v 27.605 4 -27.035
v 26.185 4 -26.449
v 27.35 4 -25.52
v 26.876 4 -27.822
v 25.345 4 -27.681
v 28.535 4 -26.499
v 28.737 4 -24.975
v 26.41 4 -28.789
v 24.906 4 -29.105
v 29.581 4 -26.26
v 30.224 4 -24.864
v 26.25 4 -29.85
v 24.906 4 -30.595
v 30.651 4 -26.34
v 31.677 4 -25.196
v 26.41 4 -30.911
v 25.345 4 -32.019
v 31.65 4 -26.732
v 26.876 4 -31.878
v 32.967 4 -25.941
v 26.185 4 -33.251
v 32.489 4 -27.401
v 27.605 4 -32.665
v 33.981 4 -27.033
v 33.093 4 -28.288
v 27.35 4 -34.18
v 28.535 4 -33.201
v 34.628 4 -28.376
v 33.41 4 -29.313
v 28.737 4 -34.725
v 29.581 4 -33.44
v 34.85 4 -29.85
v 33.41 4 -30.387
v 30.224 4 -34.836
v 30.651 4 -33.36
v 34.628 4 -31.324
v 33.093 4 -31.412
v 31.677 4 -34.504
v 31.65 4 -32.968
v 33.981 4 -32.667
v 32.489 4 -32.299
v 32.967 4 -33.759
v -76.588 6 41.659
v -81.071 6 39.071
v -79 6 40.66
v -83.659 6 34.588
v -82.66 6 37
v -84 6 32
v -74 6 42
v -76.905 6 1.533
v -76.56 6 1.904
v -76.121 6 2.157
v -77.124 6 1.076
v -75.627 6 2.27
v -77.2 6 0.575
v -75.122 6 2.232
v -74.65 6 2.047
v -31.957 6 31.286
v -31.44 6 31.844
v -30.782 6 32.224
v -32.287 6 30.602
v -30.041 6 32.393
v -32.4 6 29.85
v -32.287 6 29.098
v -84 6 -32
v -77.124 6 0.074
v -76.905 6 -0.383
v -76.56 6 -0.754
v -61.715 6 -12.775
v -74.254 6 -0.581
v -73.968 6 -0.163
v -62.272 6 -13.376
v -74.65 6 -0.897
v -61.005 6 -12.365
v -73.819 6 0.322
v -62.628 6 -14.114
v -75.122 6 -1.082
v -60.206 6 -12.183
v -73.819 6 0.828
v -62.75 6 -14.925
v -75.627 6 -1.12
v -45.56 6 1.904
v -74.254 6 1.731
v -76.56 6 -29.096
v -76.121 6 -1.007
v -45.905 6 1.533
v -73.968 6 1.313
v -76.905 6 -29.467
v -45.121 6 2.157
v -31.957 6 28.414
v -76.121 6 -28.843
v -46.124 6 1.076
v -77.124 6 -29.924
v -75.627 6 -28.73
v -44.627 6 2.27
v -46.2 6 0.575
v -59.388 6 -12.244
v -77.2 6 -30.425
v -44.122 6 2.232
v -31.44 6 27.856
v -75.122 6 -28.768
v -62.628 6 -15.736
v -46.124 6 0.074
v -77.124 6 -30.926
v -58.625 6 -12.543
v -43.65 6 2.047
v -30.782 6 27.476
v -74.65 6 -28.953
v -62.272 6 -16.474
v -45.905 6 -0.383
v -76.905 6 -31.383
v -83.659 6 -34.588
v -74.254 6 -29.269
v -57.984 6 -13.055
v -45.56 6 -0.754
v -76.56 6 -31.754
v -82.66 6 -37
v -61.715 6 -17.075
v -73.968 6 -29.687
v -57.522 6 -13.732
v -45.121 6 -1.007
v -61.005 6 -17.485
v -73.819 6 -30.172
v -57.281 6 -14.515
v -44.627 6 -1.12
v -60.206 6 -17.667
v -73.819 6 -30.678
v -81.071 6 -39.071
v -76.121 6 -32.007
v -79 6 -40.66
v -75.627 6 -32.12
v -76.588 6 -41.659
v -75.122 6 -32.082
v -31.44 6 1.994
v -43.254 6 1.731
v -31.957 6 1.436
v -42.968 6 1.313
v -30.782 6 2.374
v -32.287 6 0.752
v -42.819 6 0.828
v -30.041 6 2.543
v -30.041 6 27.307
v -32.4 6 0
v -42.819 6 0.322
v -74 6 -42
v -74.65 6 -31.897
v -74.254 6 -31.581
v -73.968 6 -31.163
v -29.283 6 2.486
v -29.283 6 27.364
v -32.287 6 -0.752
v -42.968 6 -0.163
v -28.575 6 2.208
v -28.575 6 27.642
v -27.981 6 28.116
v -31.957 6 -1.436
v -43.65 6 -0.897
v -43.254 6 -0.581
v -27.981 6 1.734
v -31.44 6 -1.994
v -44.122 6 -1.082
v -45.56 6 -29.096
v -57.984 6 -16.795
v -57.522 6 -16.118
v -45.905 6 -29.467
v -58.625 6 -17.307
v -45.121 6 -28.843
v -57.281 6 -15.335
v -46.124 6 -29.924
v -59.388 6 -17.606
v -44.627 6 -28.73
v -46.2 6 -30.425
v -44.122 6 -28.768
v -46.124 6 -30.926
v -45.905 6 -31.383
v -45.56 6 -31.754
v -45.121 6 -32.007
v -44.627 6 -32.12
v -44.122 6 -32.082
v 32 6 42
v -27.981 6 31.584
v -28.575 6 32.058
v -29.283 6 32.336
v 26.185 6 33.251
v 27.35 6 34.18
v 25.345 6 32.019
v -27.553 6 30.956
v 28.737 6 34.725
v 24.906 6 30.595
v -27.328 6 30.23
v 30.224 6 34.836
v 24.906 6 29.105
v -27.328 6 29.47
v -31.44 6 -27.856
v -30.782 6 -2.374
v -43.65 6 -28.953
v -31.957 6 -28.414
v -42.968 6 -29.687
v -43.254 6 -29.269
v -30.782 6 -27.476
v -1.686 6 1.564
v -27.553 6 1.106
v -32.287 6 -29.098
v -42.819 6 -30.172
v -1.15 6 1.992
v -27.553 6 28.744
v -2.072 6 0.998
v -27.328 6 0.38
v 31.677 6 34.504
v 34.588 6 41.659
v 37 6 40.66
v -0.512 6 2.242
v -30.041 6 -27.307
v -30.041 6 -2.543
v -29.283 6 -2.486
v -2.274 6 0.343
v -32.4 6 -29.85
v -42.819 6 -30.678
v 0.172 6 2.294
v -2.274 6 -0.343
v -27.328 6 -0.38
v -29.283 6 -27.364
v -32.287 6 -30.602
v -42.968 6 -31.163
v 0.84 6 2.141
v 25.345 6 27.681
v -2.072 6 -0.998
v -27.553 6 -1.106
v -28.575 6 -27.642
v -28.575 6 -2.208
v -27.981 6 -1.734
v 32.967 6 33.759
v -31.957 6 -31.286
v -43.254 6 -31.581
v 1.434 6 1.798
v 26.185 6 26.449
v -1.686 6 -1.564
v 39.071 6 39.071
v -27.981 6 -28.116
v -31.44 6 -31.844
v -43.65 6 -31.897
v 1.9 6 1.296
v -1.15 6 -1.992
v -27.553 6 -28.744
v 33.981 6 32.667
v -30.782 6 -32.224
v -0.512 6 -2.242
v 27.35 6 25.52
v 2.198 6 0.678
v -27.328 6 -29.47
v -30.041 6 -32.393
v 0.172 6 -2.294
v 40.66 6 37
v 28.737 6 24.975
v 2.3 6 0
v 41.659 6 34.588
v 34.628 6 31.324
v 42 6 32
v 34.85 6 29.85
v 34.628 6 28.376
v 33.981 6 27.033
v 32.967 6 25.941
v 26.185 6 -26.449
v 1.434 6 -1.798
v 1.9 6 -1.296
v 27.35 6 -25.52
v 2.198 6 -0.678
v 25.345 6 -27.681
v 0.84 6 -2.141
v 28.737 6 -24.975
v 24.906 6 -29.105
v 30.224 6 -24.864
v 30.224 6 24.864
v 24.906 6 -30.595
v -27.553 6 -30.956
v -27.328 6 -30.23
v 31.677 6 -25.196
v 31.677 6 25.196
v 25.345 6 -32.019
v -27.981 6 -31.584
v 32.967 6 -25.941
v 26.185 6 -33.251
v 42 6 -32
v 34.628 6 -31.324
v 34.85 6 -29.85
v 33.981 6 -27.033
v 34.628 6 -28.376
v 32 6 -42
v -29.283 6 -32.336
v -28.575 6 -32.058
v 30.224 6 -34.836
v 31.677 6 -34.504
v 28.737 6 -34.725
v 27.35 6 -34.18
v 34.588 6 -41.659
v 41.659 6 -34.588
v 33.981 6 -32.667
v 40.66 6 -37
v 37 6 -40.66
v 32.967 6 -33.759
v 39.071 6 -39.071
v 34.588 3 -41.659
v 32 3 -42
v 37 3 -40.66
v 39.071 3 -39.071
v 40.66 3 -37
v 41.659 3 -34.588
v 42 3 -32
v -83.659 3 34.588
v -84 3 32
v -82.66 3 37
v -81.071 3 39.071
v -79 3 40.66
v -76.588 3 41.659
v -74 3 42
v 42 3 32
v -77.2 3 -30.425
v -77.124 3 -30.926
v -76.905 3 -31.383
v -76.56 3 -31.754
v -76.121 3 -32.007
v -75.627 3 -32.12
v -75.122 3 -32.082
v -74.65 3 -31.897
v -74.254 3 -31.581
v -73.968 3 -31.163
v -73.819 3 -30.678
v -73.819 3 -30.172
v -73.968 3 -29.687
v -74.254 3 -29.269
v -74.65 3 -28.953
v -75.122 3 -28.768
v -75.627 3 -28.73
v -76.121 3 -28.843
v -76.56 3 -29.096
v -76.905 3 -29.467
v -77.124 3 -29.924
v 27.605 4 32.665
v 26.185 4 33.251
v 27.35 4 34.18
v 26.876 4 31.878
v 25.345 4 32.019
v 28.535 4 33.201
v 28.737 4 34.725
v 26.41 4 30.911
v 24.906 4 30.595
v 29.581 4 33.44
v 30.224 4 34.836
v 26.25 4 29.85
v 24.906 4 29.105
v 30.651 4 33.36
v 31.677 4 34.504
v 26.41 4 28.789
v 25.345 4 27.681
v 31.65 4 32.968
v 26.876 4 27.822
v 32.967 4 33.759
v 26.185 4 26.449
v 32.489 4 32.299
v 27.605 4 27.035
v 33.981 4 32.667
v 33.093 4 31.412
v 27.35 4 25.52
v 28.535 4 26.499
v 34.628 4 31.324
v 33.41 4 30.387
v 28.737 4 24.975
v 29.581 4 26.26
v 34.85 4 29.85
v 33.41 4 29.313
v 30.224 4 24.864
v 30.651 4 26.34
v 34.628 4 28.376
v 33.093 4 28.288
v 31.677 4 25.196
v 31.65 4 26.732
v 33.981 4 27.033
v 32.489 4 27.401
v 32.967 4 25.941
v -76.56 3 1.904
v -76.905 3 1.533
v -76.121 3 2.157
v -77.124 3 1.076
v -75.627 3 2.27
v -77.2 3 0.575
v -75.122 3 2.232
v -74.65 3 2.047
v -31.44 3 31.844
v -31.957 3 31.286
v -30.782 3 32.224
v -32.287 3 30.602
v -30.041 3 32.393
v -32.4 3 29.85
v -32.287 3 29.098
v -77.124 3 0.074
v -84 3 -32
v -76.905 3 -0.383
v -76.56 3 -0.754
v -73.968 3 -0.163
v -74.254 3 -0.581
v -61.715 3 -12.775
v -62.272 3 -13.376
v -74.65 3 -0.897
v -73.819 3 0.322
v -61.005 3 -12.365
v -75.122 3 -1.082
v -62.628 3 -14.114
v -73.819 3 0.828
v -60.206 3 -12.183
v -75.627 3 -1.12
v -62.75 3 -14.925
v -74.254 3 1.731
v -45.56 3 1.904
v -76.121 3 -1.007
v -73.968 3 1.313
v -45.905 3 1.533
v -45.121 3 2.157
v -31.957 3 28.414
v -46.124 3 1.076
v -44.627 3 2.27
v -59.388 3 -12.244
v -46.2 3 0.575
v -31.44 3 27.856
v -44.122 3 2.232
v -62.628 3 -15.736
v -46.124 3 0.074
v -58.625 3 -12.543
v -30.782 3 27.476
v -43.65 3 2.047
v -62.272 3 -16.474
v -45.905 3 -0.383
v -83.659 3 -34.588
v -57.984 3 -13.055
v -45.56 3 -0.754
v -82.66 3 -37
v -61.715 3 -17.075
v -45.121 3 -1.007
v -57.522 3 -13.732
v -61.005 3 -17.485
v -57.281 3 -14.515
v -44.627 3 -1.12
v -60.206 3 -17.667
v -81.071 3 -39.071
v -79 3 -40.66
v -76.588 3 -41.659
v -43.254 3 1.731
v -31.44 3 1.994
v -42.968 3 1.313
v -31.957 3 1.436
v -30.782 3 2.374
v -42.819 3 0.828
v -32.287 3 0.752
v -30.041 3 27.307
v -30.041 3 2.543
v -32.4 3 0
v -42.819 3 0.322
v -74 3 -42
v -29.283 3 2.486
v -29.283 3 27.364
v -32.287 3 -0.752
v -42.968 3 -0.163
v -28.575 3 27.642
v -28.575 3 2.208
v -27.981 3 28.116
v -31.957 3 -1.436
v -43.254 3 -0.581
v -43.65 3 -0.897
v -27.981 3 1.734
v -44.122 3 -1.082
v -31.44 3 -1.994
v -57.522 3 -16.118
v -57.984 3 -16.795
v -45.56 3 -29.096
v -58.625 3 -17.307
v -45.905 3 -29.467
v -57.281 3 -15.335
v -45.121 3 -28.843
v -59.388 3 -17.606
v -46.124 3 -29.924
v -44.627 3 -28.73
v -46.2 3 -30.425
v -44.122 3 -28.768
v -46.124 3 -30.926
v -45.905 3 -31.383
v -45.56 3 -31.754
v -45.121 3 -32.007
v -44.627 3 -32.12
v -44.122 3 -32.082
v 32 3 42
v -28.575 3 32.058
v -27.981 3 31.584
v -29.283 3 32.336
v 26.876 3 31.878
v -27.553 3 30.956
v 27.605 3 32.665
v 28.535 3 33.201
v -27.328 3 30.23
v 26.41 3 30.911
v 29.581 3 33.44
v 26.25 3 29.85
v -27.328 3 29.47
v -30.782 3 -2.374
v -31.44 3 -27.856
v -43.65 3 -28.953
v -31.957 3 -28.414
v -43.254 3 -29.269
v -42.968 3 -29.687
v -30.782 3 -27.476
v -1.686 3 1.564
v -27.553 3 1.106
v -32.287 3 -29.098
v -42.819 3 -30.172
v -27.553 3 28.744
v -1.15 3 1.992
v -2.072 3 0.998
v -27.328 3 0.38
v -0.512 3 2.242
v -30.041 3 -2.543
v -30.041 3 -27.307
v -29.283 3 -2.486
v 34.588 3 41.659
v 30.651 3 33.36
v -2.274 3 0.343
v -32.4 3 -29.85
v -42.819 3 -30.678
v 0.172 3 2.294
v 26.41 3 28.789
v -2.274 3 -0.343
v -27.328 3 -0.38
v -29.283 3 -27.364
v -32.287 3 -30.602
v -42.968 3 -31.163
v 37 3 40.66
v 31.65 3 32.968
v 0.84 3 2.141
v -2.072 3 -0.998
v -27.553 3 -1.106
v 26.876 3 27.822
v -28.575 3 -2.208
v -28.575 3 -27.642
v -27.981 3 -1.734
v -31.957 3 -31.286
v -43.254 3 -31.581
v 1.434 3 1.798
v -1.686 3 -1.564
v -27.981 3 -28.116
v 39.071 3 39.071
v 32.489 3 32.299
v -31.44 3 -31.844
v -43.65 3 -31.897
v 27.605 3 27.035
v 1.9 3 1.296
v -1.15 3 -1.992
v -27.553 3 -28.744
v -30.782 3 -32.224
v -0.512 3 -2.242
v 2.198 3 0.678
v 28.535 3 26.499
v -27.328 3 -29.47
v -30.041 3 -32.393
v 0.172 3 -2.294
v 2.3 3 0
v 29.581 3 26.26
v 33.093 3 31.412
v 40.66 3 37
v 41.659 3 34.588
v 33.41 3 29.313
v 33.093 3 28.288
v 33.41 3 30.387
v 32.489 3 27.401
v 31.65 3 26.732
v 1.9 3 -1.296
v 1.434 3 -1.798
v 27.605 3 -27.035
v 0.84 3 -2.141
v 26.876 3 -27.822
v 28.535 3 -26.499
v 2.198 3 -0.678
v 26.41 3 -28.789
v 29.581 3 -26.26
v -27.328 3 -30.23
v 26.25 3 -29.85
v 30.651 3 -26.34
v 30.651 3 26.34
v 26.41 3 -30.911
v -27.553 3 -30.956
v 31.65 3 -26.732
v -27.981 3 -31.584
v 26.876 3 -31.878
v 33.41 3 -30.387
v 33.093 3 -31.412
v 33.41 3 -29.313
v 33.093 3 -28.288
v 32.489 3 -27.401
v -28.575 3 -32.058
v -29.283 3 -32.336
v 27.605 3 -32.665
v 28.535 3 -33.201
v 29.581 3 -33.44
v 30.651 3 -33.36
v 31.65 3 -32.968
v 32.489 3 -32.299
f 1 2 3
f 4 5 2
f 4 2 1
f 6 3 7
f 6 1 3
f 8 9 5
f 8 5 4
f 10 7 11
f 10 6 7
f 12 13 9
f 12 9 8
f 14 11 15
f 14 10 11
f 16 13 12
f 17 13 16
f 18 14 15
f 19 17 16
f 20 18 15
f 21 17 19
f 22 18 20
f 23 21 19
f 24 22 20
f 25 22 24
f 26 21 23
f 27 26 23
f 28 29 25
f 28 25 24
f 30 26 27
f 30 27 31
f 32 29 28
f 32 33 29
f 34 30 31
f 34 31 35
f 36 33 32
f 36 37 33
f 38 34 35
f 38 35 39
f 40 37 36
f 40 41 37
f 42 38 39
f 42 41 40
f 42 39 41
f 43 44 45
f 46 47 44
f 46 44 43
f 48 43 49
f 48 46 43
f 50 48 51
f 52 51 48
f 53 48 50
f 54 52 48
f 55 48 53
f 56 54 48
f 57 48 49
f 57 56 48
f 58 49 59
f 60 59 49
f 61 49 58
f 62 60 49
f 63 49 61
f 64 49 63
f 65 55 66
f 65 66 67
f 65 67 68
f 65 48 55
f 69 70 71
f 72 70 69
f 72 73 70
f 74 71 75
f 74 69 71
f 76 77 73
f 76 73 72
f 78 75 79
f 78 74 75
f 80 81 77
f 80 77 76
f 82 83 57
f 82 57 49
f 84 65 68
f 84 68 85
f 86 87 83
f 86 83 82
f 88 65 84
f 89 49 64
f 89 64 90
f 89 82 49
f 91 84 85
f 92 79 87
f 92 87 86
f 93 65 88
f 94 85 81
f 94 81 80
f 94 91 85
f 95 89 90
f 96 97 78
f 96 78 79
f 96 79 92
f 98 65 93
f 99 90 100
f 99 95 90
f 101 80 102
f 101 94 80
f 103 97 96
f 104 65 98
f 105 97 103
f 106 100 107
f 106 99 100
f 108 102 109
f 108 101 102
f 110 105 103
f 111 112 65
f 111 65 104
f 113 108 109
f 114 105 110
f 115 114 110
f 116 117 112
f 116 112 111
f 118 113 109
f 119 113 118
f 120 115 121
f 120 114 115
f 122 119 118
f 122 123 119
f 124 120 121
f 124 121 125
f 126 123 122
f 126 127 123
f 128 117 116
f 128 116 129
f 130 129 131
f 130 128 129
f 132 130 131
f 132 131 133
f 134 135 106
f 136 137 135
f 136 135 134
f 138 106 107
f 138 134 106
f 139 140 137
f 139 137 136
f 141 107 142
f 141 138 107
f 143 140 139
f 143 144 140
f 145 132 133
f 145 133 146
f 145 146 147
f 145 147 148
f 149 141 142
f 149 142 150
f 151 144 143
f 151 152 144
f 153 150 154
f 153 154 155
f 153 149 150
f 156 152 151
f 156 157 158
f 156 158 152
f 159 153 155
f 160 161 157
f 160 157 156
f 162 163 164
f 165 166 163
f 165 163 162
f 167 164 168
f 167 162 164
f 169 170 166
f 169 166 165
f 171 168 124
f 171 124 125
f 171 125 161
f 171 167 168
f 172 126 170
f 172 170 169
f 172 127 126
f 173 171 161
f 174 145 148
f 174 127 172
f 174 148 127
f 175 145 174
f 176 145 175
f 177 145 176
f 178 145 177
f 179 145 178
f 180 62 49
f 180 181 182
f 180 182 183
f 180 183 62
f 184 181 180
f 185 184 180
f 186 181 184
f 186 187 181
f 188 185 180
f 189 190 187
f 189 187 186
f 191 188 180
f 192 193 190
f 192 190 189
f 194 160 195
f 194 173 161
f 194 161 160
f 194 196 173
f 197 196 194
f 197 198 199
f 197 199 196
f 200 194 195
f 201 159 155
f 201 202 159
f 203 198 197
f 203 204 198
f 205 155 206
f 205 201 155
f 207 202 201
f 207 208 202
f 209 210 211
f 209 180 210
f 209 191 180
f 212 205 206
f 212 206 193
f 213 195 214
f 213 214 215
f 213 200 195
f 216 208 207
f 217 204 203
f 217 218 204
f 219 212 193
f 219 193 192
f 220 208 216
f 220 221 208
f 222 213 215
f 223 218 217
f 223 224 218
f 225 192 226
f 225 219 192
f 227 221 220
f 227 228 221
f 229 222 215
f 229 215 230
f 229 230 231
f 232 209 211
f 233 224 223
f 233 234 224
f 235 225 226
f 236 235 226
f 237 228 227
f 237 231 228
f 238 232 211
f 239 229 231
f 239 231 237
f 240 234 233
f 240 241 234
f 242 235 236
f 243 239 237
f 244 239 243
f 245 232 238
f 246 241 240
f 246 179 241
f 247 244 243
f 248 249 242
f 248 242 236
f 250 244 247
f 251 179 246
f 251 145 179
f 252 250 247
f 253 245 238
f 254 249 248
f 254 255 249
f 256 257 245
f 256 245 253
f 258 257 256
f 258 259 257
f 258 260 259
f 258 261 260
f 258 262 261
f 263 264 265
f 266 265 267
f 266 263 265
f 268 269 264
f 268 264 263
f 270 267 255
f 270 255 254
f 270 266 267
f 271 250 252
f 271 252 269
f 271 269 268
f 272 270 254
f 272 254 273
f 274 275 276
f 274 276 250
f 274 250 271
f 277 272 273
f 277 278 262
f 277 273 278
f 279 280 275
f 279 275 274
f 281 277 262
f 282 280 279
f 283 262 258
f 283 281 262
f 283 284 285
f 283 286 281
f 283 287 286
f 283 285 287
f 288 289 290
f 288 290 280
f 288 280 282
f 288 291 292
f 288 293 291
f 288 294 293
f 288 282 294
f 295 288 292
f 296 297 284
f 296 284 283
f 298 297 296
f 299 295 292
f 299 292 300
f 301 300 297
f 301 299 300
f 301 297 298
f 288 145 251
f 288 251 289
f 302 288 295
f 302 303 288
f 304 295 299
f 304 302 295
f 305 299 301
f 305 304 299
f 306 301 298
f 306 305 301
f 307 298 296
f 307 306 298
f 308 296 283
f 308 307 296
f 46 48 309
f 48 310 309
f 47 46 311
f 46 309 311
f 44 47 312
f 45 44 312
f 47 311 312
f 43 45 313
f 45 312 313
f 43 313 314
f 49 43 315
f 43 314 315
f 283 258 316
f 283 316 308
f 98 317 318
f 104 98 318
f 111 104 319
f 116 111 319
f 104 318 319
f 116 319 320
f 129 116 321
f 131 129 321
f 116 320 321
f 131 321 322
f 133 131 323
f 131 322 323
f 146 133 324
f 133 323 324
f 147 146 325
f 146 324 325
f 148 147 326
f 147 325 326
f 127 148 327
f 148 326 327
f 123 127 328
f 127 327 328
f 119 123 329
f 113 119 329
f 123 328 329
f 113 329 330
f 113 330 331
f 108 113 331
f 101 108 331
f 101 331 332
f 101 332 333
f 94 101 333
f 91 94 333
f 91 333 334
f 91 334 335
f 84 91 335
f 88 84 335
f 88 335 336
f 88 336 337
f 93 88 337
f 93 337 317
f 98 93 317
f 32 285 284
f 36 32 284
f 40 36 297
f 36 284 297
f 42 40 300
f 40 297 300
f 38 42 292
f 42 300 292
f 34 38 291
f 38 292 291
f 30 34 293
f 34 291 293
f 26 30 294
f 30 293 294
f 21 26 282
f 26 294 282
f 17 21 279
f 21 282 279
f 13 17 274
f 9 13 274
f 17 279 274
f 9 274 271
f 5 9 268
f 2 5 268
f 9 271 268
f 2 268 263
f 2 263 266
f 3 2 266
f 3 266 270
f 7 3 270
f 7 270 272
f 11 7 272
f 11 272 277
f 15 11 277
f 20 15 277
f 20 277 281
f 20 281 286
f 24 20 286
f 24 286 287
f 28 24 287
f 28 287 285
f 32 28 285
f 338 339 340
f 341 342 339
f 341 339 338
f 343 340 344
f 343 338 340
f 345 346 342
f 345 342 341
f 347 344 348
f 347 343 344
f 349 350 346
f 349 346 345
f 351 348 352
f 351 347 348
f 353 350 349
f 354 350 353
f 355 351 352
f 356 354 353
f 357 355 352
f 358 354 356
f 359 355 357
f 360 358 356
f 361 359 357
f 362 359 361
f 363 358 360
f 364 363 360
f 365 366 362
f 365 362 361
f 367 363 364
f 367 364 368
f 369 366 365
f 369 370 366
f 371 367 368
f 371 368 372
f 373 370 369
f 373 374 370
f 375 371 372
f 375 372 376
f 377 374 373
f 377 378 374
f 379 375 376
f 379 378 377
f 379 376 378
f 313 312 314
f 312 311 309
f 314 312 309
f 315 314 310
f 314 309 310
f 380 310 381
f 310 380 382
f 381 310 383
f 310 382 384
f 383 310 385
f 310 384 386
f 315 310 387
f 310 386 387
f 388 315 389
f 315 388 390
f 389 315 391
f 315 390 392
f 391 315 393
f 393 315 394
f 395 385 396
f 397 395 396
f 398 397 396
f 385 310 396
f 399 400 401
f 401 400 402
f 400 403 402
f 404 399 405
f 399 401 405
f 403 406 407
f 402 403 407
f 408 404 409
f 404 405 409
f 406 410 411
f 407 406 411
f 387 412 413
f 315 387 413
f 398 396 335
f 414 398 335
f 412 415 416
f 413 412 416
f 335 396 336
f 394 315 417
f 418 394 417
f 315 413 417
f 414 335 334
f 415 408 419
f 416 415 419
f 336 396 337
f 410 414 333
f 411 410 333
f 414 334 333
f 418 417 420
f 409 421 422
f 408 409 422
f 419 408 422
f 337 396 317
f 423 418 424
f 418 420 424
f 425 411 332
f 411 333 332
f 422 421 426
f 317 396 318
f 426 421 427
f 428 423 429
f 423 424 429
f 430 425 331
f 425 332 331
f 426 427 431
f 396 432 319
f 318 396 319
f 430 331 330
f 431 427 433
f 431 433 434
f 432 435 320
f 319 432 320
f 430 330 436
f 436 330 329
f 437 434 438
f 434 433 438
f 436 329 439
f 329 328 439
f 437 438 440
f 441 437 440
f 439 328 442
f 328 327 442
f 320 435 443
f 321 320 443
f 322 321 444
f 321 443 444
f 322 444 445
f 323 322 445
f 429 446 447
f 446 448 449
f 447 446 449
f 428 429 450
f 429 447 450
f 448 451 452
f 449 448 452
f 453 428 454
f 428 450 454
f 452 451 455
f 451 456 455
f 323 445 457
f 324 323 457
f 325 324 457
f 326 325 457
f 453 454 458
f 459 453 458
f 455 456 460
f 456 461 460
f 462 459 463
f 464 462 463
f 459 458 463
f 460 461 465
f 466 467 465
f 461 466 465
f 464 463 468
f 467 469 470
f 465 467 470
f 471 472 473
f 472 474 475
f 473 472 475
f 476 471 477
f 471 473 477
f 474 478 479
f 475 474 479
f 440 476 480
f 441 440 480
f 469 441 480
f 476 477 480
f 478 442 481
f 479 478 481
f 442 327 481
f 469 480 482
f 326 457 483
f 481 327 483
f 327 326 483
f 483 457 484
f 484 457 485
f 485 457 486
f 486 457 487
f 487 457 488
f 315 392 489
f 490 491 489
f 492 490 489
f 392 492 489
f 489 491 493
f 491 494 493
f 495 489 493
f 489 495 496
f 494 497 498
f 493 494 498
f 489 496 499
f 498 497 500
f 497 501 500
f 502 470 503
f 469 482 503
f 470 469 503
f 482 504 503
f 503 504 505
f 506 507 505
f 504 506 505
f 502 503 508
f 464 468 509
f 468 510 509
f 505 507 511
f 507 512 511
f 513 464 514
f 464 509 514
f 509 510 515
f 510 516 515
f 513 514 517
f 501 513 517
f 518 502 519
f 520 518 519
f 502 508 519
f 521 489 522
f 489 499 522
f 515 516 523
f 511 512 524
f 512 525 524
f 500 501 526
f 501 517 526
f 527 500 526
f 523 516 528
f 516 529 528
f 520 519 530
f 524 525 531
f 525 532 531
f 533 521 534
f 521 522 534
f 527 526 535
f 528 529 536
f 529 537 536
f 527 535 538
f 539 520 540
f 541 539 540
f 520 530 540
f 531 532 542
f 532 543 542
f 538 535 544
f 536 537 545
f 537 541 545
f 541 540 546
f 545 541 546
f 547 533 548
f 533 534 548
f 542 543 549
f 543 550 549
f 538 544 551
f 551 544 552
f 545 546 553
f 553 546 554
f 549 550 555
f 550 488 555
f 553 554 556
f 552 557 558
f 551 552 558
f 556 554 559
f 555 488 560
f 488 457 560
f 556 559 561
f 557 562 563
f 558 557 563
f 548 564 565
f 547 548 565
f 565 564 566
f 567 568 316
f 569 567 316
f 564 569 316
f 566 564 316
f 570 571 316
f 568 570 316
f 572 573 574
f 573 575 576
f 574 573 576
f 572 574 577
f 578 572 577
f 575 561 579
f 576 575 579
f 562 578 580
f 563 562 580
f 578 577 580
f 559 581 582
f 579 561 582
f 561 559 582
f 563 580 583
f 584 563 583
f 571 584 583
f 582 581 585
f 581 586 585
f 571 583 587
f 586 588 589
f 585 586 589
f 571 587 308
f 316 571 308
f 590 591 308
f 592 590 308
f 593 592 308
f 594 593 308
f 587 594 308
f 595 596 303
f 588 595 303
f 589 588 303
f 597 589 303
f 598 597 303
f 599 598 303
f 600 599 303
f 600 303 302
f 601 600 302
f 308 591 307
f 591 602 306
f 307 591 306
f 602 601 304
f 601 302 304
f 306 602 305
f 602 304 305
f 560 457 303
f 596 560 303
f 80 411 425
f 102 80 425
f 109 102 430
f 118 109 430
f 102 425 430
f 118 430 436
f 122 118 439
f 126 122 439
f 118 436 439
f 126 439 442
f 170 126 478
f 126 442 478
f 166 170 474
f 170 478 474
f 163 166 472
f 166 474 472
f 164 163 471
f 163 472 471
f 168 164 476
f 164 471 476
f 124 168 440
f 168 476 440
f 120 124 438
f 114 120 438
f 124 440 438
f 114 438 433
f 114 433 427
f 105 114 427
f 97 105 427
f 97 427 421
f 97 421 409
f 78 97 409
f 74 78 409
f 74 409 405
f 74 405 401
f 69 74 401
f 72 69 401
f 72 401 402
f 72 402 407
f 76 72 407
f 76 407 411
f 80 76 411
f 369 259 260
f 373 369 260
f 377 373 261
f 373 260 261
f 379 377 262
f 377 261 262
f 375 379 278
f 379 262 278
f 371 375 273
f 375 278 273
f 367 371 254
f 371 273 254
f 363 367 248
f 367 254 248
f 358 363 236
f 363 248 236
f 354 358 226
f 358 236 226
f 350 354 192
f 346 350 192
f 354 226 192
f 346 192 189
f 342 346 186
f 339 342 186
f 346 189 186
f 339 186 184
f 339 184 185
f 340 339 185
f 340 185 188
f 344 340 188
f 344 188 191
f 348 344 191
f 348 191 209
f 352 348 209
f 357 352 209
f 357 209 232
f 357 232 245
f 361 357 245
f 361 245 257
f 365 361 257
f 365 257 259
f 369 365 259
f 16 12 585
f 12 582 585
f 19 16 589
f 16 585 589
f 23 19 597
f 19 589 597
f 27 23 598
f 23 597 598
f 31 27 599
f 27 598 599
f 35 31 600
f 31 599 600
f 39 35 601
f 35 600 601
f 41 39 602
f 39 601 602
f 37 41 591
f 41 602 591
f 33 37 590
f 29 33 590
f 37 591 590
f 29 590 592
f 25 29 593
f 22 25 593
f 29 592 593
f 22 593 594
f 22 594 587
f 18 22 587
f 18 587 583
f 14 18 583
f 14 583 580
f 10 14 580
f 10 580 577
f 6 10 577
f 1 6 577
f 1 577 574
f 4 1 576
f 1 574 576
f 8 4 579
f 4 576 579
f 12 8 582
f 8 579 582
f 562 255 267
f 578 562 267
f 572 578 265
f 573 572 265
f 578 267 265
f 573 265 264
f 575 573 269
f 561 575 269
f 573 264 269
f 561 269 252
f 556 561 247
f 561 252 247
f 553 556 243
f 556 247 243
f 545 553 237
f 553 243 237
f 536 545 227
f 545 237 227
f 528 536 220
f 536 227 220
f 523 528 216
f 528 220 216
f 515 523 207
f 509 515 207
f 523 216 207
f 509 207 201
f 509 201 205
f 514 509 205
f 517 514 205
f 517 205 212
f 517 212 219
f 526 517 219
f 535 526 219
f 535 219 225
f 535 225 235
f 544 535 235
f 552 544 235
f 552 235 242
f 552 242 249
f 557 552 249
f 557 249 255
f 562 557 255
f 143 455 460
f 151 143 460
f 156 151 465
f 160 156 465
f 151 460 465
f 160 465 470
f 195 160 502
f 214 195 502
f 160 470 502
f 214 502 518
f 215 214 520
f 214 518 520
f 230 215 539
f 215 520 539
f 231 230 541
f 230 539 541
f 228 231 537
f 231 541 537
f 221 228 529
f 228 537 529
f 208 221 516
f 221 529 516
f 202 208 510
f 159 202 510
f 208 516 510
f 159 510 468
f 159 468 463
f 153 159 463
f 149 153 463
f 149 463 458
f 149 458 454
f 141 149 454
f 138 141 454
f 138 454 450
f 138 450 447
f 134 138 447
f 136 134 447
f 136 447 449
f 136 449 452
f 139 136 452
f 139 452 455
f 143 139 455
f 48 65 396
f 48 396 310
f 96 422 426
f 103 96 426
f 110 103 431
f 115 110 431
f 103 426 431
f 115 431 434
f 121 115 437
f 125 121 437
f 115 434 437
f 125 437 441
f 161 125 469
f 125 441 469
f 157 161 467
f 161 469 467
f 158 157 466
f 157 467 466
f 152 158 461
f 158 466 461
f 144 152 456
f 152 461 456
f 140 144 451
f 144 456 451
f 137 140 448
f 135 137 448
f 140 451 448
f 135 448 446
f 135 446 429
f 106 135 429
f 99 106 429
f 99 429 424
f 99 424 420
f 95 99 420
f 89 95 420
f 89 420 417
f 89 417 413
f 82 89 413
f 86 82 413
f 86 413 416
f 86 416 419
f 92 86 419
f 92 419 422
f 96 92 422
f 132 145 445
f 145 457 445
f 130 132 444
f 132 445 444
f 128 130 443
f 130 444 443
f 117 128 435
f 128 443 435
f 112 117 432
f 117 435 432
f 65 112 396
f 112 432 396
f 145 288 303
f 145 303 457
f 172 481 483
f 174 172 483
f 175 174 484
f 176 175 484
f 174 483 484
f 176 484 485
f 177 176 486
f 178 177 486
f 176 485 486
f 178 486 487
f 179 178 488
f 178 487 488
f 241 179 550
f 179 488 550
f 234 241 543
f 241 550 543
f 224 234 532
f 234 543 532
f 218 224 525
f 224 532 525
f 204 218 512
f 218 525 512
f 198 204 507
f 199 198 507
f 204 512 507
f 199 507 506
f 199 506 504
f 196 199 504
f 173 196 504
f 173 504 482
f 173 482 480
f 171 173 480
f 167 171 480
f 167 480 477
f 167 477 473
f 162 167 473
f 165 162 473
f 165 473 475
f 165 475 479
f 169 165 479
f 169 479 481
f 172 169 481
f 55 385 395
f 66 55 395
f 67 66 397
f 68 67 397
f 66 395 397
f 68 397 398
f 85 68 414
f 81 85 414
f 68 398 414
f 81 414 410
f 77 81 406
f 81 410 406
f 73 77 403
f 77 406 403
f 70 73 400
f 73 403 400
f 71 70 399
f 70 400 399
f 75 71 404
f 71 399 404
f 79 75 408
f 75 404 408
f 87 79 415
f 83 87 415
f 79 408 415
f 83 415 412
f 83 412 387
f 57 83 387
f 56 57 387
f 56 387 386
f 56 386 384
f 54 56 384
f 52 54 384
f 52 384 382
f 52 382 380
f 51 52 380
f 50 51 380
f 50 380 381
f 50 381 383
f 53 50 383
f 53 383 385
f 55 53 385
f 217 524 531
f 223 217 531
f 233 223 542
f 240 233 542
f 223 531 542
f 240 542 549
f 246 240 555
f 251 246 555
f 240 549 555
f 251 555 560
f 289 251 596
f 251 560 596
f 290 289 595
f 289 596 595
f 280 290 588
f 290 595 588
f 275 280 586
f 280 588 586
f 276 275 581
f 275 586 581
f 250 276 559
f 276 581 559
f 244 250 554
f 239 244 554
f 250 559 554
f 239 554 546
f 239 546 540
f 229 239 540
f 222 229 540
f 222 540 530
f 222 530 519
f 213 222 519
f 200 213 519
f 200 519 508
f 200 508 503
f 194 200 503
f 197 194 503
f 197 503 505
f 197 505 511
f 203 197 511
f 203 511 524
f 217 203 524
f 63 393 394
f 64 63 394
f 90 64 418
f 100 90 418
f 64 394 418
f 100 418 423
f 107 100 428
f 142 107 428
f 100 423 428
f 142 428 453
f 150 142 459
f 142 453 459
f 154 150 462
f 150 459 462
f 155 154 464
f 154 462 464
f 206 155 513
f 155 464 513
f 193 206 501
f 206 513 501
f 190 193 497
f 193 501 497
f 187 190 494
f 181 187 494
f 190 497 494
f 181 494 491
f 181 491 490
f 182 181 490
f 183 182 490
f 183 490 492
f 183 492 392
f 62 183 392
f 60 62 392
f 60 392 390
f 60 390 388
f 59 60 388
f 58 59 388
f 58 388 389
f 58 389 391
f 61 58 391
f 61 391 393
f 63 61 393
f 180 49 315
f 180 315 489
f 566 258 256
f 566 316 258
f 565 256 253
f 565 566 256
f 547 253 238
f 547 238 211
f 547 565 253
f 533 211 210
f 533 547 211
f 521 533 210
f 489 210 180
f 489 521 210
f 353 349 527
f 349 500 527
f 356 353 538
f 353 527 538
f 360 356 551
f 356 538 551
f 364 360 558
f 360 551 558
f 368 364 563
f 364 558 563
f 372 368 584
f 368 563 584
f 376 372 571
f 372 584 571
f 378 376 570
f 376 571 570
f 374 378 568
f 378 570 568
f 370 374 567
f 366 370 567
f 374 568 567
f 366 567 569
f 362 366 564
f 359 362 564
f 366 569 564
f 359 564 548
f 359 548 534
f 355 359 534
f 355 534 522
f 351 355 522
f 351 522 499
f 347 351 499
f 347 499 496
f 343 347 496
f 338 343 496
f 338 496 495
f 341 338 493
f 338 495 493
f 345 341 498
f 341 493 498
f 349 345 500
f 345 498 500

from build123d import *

# Parameters (mm, degrees)
BOSS_EXTRUDE1_DEPTH              = 3
F_4_6_4_6_DIAMETER_HOLE1_D       = 4.6
CBORE_FOR_M6_5_SHSS1_D           = 7.2
CBORE_FOR_M6_5_SHSS1_CBORE_D     = 10
CBORE_FOR_M6_5_SHSS1_CBORE_DEPTH = 2
M10X1_0_TAPPED_HOLE1_D           = 5.1
F_3_0MM_DOWEL_HOLE1_D            = 3.4
F_5_0MM_DOWEL_HOLE1_D            = 5.5
FILLET3_R                        = 10


with BuildPart() as part:
    # Sketch1 → Boss-Extrude1 (new body)
    with BuildSketch(Plane(origin=(0, 6, 0), x_dir=(1, 0, 0), z_dir=(0, 1, 0))):
        Polygon((42, 42), (-42, 42), (-84, 42), (-84, -42), (-42, -42), (42, -42), align=None)
    extrude(amount=-BOSS_EXTRUDE1_DEPTH)

    # Ø4.6 (4.6) Diameter Hole1 (through all)
    with Locations(Plane(origin=(0, 3, 0), x_dir=(-1, 0, 0), z_dir=(0, -1, 0))):
        with Locations((0, 0)):
            Hole(F_4_6_4_6_DIAMETER_HOLE1_D / 2)

    # CBORE for M6.5 SHSS1 (through all)
    with Locations(Plane(origin=(0, 6, 0), x_dir=(1, 0, 0), z_dir=(0, 1, 0))):
        with Locations((29.85, 29.85), (29.85, -29.85)):
            CounterBoreHole(CBORE_FOR_M6_5_SHSS1_D / 2, CBORE_FOR_M6_5_SHSS1_CBORE_D / 2, CBORE_FOR_M6_5_SHSS1_CBORE_DEPTH)

    # M10x1.0 Tapped Hole1 (through all)
    with Locations(Plane(origin=(0, 6, 0), x_dir=(1, 0, 0), z_dir=(0, 1, 0))):
        with Locations((-29.85, -29.85), (-29.85, 29.85), (-29.85, 0)):
            Hole(M10X1_0_TAPPED_HOLE1_D / 2)

    # Ø3.0mm Dowel Hole1 (through all)
    with Locations(Plane(origin=(0, 6, 0), x_dir=(1, 0, 0), z_dir=(0, 1, 0))):
        with Locations((-75.5, 30.425), (-44.5, 30.425), (-44.5, -0.575), (-75.5, -0.575)):
            Hole(F_3_0MM_DOWEL_HOLE1_D / 2)

    # Ø5.0mm Dowel Hole1 (through all)
    with Locations(Plane(origin=(0, 6, 0), x_dir=(1, 0, 0), z_dir=(0, 1, 0))):
        with Locations((-60, 14.925)):
            Hole(F_5_0MM_DOWEL_HOLE1_D / 2)

    # Fillet3
    fillet3_edges = [part.edges().sort_by_distance(p)[0] for p in [
        (42, 4.5, -42),
        (42, 4.5, 42),
        (-84, 4.5, 42),
        (-84, 4.5, -42),
    ]]
    fillet(fillet3_edges, radius=FILLET3_R)


solid = part.part
